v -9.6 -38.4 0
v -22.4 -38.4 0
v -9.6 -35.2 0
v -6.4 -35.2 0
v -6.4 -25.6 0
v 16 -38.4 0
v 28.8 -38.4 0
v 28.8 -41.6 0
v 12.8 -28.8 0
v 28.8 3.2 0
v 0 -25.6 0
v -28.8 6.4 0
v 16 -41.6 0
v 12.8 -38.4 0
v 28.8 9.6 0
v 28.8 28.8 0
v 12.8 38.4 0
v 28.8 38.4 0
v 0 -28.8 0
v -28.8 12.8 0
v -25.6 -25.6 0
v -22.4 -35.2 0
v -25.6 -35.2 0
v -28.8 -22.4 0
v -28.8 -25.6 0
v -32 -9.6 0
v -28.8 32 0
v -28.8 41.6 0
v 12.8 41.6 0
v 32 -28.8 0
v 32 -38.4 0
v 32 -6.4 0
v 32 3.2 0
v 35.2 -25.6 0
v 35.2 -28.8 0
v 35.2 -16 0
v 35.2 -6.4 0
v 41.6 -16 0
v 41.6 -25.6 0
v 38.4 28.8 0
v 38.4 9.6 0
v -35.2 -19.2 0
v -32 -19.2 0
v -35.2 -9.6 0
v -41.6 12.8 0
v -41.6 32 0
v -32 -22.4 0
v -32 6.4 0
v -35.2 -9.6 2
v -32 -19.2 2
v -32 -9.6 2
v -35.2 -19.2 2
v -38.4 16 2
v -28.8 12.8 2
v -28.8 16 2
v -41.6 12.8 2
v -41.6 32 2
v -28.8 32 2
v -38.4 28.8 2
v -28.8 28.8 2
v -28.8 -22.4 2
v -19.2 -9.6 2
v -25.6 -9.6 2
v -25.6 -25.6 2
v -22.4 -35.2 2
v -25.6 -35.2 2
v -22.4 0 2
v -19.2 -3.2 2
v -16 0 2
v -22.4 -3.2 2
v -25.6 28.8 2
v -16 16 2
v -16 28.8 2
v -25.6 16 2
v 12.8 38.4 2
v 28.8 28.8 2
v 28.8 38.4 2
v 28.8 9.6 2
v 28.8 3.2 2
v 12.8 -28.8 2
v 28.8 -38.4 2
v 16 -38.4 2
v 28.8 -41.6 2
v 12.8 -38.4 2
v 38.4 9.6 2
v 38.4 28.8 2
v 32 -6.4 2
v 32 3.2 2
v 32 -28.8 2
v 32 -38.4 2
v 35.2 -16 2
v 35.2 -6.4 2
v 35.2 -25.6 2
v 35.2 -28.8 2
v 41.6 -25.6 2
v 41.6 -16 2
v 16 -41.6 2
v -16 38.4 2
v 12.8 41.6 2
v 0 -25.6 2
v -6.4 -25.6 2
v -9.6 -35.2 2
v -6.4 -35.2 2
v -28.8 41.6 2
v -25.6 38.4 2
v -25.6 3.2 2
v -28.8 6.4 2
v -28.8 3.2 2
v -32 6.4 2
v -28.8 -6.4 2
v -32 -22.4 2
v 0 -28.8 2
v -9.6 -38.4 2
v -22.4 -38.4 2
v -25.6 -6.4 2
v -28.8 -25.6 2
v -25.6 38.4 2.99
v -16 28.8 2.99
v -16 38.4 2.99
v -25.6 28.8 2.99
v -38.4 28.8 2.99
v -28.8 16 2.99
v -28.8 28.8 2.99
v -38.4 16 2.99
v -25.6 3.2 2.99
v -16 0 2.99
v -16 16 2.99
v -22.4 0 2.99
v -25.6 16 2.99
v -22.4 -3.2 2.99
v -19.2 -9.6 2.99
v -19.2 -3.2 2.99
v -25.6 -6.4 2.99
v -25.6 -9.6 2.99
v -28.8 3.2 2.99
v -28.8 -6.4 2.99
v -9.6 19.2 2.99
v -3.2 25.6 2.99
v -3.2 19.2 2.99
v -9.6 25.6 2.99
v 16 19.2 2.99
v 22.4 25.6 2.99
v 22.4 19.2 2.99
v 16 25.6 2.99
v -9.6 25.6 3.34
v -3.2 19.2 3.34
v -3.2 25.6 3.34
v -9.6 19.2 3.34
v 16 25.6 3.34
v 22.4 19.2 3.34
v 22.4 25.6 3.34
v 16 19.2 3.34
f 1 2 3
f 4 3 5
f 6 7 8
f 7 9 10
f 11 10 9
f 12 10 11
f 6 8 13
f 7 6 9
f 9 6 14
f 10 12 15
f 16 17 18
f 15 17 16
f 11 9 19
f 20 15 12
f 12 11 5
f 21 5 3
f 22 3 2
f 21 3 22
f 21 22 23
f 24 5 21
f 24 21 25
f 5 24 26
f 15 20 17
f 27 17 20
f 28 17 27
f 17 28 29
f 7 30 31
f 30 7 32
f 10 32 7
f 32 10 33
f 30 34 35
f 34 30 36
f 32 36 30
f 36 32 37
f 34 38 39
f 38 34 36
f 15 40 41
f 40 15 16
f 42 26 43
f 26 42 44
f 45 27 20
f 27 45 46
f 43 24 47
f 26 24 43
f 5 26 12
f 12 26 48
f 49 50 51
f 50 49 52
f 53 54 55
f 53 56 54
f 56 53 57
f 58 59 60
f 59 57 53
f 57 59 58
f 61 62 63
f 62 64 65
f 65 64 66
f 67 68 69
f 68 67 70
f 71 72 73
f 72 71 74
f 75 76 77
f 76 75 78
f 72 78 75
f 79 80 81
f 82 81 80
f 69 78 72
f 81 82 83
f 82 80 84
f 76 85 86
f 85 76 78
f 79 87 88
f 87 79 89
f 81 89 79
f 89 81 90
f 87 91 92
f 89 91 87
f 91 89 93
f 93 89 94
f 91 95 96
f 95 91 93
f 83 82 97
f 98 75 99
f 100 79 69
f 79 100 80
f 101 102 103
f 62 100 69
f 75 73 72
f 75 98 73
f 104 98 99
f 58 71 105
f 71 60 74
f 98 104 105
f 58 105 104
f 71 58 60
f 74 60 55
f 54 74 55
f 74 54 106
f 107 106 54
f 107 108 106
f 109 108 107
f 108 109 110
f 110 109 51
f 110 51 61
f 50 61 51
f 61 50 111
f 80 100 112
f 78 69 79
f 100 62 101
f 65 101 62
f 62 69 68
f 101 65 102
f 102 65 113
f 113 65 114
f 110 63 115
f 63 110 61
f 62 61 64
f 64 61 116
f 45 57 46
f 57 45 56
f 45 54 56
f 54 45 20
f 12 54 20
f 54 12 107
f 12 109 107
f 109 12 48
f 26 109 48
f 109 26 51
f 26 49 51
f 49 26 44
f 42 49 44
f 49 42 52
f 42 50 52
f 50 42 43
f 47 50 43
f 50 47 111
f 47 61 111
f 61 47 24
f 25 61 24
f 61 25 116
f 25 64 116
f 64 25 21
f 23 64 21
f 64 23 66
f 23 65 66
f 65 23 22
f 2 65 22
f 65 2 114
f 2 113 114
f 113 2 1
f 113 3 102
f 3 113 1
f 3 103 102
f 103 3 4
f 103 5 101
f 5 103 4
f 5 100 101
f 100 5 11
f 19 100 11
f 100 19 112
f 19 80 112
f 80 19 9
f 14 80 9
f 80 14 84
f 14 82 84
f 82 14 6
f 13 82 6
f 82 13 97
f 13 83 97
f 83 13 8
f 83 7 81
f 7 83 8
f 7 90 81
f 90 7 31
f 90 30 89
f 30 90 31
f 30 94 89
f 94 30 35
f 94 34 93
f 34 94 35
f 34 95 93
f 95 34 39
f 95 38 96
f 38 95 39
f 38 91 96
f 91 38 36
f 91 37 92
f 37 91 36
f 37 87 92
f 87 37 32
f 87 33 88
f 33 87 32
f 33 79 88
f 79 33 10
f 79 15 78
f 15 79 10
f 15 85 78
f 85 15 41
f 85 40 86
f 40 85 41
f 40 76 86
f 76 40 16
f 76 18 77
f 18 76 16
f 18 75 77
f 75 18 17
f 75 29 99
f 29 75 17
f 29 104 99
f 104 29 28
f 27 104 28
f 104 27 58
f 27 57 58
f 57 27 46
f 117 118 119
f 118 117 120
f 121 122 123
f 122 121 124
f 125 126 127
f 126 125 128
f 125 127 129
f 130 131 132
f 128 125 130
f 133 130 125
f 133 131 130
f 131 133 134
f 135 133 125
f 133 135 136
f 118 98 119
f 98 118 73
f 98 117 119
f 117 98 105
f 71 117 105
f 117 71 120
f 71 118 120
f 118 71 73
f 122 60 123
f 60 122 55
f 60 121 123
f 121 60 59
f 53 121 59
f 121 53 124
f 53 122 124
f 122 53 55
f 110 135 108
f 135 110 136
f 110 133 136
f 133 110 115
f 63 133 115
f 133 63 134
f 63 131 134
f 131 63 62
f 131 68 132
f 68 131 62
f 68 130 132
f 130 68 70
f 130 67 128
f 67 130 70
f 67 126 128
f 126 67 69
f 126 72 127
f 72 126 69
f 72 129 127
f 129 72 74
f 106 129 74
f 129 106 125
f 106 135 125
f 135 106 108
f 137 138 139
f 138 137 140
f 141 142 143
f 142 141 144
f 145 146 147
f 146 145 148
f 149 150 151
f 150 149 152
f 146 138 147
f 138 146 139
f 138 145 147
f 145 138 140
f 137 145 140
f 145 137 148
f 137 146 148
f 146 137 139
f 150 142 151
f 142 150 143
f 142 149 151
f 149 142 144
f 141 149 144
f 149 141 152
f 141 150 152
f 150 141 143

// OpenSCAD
// Skateboard Charm - Version 003
// Reference: references/17_clawd_skateboard.png
// Changes from previous version:
// - Boosted the orange, yellow, and maroon material colors for closer preview matching.
// - Added a thin raised white rim/negative-space layer over the backing.
// - Extended the right deck run slightly to better match the reference skateboard edge.

eps = 0.01;
$fn = 24;

unit = 3.2;
grid_w = 28;
grid_h = 28;

base_h = 2.0;
relief_h = 1.0;
detail_h = 1.15;
rim_h = 0.18;

white = [1.00, 1.00, 1.00];
orange = [1.00, 0.54, 0.39];
shadow_orange = [0.78, 0.36, 0.27];
black = [0.03, 0.03, 0.03];
maroon = [0.39, 0.08, 0.18];
wheel_yellow = [1.00, 0.76, 0.34];

// Horizontal pixel runs: [x, y_from_top, width, height].
base_runs = [
    [5, 1, 13, 1],
    [5, 2, 18, 1],
    [5, 3, 18, 1],
    [1, 4, 22, 1],
    [1, 5, 25, 1],
    [1, 6, 25, 1],
    [1, 7, 25, 1],
    [1, 8, 25, 1],
    [1, 9, 25, 1],
    [5, 10, 21, 1],
    [5, 11, 18, 1],
    [4, 12, 19, 1],
    [4, 13, 20, 1],
    [4, 14, 20, 1],
    [4, 15, 20, 1],
    [4, 16, 21, 1],
    [3, 17, 22, 1],
    [3, 18, 22, 1],
    [3, 19, 24, 1],
    [4, 20, 23, 1],
    [5, 21, 22, 1],
    [6, 22, 6, 1],
    [14, 22, 11, 1],
    [6, 23, 6, 1],
    [18, 23, 6, 1],
    [6, 24, 6, 1],
    [18, 24, 6, 1],
    [7, 25, 4, 1],
    [18, 25, 6, 1],
    [19, 26, 4, 1]
];

white_runs = [
    [5, 1, 13, 1],
    [5, 2, 1, 1],
    [17, 2, 6, 1],
    [5, 3, 1, 1],
    [22, 3, 1, 1],
    [1, 4, 5, 1],
    [22, 4, 1, 1],
    [1, 5, 1, 1],
    [22, 5, 4, 1],
    [1, 6, 1, 1],
    [25, 6, 1, 1],
    [1, 7, 1, 1],
    [25, 7, 1, 1],
    [1, 8, 1, 1],
    [25, 8, 1, 1],
    [1, 9, 5, 1],
    [25, 9, 1, 1],
    [5, 10, 1, 1],
    [22, 10, 4, 1],
    [5, 11, 1, 1],
    [22, 11, 1, 1],
    [4, 12, 2, 1],
    [22, 12, 1, 1],
    [4, 13, 1, 1],
    [22, 13, 2, 1],
    [4, 14, 1, 1],
    [7, 14, 3, 1],
    [12, 14, 4, 1],
    [23, 14, 1, 1],
    [4, 15, 1, 1],
    [8, 15, 2, 1],
    [12, 15, 6, 1],
    [20, 15, 1, 1],
    [23, 15, 1, 1],
    [4, 16, 2, 1],
    [8, 16, 3, 1],
    [13, 16, 5, 1],
    [20, 16, 1, 1],
    [23, 16, 2, 1],
    [3, 17, 8, 1],
    [13, 17, 6, 1],
    [21, 17, 1, 1],
    [24, 17, 1, 1],
    [3, 18, 1, 1],
    [6, 18, 13, 1],
    [21, 18, 1, 1],
    [24, 18, 1, 1],
    [3, 19, 2, 1],
    [7, 19, 20, 1],
    [4, 20, 2, 1],
    [16, 20, 7, 1],
    [26, 20, 1, 1],
    [5, 21, 3, 1],
    [10, 21, 5, 1],
    [24, 21, 3, 1],
    [6, 22, 1, 1],
    [11, 22, 1, 1],
    [14, 22, 6, 1],
    [22, 22, 3, 1],
    [6, 23, 1, 1],
    [11, 23, 1, 1],
    [18, 23, 1, 1],
    [23, 23, 1, 1],
    [6, 24, 2, 1],
    [10, 24, 2, 1],
    [18, 24, 1, 1],
    [23, 24, 1, 1],
    [7, 25, 4, 1],
    [18, 25, 2, 1],
    [22, 25, 2, 1],
    [19, 26, 4, 1]
];

orange_runs = [
    [9, 2, 8, 1],
    [9, 3, 13, 1],
    [9, 4, 13, 1],
    [5, 5, 17, 1],
    [5, 6, 6, 1],
    [13, 6, 6, 1],
    [21, 6, 4, 1],
    [5, 7, 6, 1],
    [13, 7, 6, 1],
    [21, 7, 4, 1],
    [5, 8, 20, 1],
    [9, 9, 16, 1],
    [9, 10, 13, 1],
    [9, 11, 13, 1],
    [9, 12, 13, 1],
    [9, 13, 13, 1],
    [10, 14, 2, 1],
    [16, 14, 7, 1],
    [10, 15, 2, 1],
    [18, 15, 2, 1],
    [21, 15, 2, 1],
    [11, 16, 2, 1],
    [18, 16, 2, 1],
    [21, 16, 2, 1],
    [11, 17, 2, 1],
    [19, 17, 2, 1],
    [22, 17, 2, 1],
    [19, 18, 2, 1],
    [22, 18, 2, 1]
];

shadow_runs = [
    [6, 2, 3, 1],
    [6, 3, 3, 1],
    [6, 4, 3, 1],
    [2, 5, 3, 1],
    [2, 6, 3, 1],
    [2, 7, 3, 1],
    [2, 8, 3, 1],
    [6, 9, 3, 1],
    [6, 10, 3, 1],
    [6, 11, 3, 1],
    [6, 12, 3, 1],
    [5, 13, 4, 1],
    [5, 14, 2, 1],
    [5, 15, 3, 1],
    [6, 16, 2, 1]
];

eye_runs = [
    [11, 6, 2, 1],
    [19, 6, 2, 1],
    [11, 7, 2, 1],
    [19, 7, 2, 1]
];

deck_runs = [
    [4, 18, 2, 1],
    [5, 19, 2, 1],
    [6, 20, 10, 1],
    [23, 20, 3, 1],
    [15, 21, 10, 1],
    [9, 22, 1, 1],
    [8, 23, 1, 1],
    [21, 23, 1, 1],
    [20, 24, 1, 1]
];

wheel_runs = [
    [8, 21, 2, 1],
    [7, 22, 2, 1],
    [10, 22, 1, 1],
    [20, 22, 2, 1],
    [7, 23, 1, 1],
    [9, 23, 2, 1],
    [19, 23, 2, 1],
    [22, 23, 1, 1],
    [8, 24, 2, 1],
    [19, 24, 1, 1],
    [21, 24, 2, 1],
    [20, 25, 2, 1]
];

module pixel_run_2d(run) {
    translate([run[0] * unit, (grid_h - run[1] - run[3]) * unit])
        square([run[2] * unit, run[3] * unit], center = false);
}

module run_layer(runs, z, h, layer_color) {
    color(layer_color)
        translate([0, 0, z])
            linear_extrude(height = h)
                union() {
                    for (run = runs)
                        pixel_run_2d(run);
                }
}

module charm() {
    translate([-grid_w * unit / 2, -grid_h * unit / 2, 0]) {
        run_layer(base_runs, 0, base_h, white);
        run_layer(white_runs, base_h - eps, rim_h, white);

        // Raised colored pixels sit into the backing with a tiny overlap.
        run_layer(orange_runs, base_h - eps, relief_h, orange);
        run_layer(shadow_runs, base_h - eps, relief_h, shadow_orange);
        run_layer(deck_runs, base_h - eps, detail_h, maroon);
        run_layer(wheel_runs, base_h - eps, relief_h, wheel_yellow);
        run_layer(eye_runs, base_h + relief_h - eps, 0.35, black);
    }
}

charm();
